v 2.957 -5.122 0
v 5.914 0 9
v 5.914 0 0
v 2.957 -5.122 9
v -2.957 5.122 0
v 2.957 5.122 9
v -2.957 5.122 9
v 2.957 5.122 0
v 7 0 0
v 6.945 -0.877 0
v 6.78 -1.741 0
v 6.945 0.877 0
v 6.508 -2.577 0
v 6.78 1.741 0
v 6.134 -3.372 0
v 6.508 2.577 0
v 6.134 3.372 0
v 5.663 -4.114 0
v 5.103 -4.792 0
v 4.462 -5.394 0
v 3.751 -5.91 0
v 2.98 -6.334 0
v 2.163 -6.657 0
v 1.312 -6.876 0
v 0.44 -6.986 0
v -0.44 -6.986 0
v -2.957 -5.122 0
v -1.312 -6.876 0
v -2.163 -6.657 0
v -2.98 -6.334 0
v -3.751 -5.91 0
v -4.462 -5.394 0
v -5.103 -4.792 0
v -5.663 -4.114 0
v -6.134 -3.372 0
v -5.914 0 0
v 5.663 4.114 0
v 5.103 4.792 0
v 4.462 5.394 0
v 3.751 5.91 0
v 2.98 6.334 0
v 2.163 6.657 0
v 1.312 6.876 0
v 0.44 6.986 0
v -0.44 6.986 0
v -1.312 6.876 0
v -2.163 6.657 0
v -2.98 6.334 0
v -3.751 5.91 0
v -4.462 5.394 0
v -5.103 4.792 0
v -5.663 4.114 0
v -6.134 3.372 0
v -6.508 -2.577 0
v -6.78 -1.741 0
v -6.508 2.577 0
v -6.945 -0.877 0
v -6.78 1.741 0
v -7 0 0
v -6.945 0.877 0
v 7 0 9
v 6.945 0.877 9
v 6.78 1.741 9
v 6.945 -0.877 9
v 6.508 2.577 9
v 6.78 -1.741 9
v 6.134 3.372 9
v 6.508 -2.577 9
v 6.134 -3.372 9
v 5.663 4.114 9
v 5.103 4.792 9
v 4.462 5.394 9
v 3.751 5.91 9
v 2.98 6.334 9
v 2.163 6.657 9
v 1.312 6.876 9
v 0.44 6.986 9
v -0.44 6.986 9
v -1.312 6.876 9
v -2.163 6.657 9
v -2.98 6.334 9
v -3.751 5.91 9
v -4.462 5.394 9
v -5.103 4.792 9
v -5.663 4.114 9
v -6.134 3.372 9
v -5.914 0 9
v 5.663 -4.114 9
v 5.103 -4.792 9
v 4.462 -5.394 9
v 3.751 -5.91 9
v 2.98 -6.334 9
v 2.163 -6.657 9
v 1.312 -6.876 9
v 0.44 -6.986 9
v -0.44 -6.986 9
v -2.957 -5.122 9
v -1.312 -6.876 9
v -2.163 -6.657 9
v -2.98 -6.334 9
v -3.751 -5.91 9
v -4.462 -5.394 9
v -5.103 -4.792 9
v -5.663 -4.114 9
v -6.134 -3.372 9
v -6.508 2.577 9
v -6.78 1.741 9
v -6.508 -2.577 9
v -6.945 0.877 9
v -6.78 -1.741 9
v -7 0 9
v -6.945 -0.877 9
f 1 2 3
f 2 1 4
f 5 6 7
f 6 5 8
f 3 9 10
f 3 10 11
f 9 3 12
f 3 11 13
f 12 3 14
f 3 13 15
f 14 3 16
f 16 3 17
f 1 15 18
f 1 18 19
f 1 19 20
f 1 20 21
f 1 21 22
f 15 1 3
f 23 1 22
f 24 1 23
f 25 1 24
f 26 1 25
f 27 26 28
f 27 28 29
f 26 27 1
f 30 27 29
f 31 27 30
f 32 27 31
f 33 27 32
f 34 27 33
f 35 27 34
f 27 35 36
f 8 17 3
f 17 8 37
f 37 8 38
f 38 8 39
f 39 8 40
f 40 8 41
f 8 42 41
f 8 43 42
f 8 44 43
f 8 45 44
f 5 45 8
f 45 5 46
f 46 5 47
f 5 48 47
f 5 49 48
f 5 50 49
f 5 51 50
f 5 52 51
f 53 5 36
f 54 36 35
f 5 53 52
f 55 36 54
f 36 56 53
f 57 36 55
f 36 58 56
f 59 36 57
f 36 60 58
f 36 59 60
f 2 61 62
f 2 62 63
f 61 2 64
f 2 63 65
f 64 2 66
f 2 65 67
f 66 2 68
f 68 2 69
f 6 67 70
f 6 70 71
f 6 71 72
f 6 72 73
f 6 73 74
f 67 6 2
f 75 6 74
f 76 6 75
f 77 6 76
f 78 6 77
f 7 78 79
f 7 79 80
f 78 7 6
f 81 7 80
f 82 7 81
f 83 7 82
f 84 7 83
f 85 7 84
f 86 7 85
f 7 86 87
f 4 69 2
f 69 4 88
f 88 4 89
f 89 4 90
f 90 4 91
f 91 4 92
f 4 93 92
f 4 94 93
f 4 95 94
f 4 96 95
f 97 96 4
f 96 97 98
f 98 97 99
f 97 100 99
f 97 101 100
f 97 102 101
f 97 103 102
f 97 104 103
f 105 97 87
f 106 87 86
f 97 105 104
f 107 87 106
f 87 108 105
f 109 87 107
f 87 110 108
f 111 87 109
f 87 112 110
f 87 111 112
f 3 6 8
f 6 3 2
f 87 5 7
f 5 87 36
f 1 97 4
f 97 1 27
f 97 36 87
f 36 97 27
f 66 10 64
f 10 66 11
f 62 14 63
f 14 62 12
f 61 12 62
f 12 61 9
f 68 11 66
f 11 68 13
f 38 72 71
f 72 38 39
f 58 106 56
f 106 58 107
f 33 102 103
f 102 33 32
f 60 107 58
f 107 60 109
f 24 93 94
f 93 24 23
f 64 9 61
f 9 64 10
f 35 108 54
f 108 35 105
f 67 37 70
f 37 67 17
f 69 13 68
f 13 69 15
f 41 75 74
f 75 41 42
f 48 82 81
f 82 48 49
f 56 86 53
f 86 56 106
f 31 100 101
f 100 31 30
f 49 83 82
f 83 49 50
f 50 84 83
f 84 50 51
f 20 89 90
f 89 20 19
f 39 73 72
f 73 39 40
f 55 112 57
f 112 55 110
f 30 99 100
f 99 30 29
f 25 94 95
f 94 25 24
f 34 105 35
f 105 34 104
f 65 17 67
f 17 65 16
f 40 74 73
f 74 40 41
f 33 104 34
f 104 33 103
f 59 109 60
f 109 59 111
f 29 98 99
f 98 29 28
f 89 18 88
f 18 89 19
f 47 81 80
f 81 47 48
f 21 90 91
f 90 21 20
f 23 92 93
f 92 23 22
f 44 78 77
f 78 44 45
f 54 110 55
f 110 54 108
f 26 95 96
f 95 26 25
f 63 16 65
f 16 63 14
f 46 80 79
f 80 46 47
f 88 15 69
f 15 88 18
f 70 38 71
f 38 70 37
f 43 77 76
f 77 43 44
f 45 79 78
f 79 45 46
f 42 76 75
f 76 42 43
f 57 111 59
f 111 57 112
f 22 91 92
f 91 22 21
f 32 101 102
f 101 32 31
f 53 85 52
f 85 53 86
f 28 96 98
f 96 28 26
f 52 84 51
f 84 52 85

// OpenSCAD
$fn = 50;


difference() {
	union() {
		cylinder(h = 9, r = 7.0000000000);
	}
	union() {
		translate(v = [0, 0, 0]) {
			rotate(a = [0, 0, 0]) {
				difference() {
					union() {
						#linear_extrude(height = 9) {
							polygon(points = [[5.9142500000, 0.0000000000], [2.9571250000, 5.1218907443], [-2.9571250000, 5.1218907443], [-5.9142500000, 0.0000000000], [-2.9571250000, -5.1218907443], [2.9571250000, -5.1218907443]]);
						}
					}
					union();
				}
			}
		}
		translate(v = [0, 0, -100]) {
			cylinder(h = 200, r = 3.2500000000);
		}
		translate(v = [0, 0, -100]) {
			cylinder(h = 200, r = 1.8000000000);
		}
	}
}
